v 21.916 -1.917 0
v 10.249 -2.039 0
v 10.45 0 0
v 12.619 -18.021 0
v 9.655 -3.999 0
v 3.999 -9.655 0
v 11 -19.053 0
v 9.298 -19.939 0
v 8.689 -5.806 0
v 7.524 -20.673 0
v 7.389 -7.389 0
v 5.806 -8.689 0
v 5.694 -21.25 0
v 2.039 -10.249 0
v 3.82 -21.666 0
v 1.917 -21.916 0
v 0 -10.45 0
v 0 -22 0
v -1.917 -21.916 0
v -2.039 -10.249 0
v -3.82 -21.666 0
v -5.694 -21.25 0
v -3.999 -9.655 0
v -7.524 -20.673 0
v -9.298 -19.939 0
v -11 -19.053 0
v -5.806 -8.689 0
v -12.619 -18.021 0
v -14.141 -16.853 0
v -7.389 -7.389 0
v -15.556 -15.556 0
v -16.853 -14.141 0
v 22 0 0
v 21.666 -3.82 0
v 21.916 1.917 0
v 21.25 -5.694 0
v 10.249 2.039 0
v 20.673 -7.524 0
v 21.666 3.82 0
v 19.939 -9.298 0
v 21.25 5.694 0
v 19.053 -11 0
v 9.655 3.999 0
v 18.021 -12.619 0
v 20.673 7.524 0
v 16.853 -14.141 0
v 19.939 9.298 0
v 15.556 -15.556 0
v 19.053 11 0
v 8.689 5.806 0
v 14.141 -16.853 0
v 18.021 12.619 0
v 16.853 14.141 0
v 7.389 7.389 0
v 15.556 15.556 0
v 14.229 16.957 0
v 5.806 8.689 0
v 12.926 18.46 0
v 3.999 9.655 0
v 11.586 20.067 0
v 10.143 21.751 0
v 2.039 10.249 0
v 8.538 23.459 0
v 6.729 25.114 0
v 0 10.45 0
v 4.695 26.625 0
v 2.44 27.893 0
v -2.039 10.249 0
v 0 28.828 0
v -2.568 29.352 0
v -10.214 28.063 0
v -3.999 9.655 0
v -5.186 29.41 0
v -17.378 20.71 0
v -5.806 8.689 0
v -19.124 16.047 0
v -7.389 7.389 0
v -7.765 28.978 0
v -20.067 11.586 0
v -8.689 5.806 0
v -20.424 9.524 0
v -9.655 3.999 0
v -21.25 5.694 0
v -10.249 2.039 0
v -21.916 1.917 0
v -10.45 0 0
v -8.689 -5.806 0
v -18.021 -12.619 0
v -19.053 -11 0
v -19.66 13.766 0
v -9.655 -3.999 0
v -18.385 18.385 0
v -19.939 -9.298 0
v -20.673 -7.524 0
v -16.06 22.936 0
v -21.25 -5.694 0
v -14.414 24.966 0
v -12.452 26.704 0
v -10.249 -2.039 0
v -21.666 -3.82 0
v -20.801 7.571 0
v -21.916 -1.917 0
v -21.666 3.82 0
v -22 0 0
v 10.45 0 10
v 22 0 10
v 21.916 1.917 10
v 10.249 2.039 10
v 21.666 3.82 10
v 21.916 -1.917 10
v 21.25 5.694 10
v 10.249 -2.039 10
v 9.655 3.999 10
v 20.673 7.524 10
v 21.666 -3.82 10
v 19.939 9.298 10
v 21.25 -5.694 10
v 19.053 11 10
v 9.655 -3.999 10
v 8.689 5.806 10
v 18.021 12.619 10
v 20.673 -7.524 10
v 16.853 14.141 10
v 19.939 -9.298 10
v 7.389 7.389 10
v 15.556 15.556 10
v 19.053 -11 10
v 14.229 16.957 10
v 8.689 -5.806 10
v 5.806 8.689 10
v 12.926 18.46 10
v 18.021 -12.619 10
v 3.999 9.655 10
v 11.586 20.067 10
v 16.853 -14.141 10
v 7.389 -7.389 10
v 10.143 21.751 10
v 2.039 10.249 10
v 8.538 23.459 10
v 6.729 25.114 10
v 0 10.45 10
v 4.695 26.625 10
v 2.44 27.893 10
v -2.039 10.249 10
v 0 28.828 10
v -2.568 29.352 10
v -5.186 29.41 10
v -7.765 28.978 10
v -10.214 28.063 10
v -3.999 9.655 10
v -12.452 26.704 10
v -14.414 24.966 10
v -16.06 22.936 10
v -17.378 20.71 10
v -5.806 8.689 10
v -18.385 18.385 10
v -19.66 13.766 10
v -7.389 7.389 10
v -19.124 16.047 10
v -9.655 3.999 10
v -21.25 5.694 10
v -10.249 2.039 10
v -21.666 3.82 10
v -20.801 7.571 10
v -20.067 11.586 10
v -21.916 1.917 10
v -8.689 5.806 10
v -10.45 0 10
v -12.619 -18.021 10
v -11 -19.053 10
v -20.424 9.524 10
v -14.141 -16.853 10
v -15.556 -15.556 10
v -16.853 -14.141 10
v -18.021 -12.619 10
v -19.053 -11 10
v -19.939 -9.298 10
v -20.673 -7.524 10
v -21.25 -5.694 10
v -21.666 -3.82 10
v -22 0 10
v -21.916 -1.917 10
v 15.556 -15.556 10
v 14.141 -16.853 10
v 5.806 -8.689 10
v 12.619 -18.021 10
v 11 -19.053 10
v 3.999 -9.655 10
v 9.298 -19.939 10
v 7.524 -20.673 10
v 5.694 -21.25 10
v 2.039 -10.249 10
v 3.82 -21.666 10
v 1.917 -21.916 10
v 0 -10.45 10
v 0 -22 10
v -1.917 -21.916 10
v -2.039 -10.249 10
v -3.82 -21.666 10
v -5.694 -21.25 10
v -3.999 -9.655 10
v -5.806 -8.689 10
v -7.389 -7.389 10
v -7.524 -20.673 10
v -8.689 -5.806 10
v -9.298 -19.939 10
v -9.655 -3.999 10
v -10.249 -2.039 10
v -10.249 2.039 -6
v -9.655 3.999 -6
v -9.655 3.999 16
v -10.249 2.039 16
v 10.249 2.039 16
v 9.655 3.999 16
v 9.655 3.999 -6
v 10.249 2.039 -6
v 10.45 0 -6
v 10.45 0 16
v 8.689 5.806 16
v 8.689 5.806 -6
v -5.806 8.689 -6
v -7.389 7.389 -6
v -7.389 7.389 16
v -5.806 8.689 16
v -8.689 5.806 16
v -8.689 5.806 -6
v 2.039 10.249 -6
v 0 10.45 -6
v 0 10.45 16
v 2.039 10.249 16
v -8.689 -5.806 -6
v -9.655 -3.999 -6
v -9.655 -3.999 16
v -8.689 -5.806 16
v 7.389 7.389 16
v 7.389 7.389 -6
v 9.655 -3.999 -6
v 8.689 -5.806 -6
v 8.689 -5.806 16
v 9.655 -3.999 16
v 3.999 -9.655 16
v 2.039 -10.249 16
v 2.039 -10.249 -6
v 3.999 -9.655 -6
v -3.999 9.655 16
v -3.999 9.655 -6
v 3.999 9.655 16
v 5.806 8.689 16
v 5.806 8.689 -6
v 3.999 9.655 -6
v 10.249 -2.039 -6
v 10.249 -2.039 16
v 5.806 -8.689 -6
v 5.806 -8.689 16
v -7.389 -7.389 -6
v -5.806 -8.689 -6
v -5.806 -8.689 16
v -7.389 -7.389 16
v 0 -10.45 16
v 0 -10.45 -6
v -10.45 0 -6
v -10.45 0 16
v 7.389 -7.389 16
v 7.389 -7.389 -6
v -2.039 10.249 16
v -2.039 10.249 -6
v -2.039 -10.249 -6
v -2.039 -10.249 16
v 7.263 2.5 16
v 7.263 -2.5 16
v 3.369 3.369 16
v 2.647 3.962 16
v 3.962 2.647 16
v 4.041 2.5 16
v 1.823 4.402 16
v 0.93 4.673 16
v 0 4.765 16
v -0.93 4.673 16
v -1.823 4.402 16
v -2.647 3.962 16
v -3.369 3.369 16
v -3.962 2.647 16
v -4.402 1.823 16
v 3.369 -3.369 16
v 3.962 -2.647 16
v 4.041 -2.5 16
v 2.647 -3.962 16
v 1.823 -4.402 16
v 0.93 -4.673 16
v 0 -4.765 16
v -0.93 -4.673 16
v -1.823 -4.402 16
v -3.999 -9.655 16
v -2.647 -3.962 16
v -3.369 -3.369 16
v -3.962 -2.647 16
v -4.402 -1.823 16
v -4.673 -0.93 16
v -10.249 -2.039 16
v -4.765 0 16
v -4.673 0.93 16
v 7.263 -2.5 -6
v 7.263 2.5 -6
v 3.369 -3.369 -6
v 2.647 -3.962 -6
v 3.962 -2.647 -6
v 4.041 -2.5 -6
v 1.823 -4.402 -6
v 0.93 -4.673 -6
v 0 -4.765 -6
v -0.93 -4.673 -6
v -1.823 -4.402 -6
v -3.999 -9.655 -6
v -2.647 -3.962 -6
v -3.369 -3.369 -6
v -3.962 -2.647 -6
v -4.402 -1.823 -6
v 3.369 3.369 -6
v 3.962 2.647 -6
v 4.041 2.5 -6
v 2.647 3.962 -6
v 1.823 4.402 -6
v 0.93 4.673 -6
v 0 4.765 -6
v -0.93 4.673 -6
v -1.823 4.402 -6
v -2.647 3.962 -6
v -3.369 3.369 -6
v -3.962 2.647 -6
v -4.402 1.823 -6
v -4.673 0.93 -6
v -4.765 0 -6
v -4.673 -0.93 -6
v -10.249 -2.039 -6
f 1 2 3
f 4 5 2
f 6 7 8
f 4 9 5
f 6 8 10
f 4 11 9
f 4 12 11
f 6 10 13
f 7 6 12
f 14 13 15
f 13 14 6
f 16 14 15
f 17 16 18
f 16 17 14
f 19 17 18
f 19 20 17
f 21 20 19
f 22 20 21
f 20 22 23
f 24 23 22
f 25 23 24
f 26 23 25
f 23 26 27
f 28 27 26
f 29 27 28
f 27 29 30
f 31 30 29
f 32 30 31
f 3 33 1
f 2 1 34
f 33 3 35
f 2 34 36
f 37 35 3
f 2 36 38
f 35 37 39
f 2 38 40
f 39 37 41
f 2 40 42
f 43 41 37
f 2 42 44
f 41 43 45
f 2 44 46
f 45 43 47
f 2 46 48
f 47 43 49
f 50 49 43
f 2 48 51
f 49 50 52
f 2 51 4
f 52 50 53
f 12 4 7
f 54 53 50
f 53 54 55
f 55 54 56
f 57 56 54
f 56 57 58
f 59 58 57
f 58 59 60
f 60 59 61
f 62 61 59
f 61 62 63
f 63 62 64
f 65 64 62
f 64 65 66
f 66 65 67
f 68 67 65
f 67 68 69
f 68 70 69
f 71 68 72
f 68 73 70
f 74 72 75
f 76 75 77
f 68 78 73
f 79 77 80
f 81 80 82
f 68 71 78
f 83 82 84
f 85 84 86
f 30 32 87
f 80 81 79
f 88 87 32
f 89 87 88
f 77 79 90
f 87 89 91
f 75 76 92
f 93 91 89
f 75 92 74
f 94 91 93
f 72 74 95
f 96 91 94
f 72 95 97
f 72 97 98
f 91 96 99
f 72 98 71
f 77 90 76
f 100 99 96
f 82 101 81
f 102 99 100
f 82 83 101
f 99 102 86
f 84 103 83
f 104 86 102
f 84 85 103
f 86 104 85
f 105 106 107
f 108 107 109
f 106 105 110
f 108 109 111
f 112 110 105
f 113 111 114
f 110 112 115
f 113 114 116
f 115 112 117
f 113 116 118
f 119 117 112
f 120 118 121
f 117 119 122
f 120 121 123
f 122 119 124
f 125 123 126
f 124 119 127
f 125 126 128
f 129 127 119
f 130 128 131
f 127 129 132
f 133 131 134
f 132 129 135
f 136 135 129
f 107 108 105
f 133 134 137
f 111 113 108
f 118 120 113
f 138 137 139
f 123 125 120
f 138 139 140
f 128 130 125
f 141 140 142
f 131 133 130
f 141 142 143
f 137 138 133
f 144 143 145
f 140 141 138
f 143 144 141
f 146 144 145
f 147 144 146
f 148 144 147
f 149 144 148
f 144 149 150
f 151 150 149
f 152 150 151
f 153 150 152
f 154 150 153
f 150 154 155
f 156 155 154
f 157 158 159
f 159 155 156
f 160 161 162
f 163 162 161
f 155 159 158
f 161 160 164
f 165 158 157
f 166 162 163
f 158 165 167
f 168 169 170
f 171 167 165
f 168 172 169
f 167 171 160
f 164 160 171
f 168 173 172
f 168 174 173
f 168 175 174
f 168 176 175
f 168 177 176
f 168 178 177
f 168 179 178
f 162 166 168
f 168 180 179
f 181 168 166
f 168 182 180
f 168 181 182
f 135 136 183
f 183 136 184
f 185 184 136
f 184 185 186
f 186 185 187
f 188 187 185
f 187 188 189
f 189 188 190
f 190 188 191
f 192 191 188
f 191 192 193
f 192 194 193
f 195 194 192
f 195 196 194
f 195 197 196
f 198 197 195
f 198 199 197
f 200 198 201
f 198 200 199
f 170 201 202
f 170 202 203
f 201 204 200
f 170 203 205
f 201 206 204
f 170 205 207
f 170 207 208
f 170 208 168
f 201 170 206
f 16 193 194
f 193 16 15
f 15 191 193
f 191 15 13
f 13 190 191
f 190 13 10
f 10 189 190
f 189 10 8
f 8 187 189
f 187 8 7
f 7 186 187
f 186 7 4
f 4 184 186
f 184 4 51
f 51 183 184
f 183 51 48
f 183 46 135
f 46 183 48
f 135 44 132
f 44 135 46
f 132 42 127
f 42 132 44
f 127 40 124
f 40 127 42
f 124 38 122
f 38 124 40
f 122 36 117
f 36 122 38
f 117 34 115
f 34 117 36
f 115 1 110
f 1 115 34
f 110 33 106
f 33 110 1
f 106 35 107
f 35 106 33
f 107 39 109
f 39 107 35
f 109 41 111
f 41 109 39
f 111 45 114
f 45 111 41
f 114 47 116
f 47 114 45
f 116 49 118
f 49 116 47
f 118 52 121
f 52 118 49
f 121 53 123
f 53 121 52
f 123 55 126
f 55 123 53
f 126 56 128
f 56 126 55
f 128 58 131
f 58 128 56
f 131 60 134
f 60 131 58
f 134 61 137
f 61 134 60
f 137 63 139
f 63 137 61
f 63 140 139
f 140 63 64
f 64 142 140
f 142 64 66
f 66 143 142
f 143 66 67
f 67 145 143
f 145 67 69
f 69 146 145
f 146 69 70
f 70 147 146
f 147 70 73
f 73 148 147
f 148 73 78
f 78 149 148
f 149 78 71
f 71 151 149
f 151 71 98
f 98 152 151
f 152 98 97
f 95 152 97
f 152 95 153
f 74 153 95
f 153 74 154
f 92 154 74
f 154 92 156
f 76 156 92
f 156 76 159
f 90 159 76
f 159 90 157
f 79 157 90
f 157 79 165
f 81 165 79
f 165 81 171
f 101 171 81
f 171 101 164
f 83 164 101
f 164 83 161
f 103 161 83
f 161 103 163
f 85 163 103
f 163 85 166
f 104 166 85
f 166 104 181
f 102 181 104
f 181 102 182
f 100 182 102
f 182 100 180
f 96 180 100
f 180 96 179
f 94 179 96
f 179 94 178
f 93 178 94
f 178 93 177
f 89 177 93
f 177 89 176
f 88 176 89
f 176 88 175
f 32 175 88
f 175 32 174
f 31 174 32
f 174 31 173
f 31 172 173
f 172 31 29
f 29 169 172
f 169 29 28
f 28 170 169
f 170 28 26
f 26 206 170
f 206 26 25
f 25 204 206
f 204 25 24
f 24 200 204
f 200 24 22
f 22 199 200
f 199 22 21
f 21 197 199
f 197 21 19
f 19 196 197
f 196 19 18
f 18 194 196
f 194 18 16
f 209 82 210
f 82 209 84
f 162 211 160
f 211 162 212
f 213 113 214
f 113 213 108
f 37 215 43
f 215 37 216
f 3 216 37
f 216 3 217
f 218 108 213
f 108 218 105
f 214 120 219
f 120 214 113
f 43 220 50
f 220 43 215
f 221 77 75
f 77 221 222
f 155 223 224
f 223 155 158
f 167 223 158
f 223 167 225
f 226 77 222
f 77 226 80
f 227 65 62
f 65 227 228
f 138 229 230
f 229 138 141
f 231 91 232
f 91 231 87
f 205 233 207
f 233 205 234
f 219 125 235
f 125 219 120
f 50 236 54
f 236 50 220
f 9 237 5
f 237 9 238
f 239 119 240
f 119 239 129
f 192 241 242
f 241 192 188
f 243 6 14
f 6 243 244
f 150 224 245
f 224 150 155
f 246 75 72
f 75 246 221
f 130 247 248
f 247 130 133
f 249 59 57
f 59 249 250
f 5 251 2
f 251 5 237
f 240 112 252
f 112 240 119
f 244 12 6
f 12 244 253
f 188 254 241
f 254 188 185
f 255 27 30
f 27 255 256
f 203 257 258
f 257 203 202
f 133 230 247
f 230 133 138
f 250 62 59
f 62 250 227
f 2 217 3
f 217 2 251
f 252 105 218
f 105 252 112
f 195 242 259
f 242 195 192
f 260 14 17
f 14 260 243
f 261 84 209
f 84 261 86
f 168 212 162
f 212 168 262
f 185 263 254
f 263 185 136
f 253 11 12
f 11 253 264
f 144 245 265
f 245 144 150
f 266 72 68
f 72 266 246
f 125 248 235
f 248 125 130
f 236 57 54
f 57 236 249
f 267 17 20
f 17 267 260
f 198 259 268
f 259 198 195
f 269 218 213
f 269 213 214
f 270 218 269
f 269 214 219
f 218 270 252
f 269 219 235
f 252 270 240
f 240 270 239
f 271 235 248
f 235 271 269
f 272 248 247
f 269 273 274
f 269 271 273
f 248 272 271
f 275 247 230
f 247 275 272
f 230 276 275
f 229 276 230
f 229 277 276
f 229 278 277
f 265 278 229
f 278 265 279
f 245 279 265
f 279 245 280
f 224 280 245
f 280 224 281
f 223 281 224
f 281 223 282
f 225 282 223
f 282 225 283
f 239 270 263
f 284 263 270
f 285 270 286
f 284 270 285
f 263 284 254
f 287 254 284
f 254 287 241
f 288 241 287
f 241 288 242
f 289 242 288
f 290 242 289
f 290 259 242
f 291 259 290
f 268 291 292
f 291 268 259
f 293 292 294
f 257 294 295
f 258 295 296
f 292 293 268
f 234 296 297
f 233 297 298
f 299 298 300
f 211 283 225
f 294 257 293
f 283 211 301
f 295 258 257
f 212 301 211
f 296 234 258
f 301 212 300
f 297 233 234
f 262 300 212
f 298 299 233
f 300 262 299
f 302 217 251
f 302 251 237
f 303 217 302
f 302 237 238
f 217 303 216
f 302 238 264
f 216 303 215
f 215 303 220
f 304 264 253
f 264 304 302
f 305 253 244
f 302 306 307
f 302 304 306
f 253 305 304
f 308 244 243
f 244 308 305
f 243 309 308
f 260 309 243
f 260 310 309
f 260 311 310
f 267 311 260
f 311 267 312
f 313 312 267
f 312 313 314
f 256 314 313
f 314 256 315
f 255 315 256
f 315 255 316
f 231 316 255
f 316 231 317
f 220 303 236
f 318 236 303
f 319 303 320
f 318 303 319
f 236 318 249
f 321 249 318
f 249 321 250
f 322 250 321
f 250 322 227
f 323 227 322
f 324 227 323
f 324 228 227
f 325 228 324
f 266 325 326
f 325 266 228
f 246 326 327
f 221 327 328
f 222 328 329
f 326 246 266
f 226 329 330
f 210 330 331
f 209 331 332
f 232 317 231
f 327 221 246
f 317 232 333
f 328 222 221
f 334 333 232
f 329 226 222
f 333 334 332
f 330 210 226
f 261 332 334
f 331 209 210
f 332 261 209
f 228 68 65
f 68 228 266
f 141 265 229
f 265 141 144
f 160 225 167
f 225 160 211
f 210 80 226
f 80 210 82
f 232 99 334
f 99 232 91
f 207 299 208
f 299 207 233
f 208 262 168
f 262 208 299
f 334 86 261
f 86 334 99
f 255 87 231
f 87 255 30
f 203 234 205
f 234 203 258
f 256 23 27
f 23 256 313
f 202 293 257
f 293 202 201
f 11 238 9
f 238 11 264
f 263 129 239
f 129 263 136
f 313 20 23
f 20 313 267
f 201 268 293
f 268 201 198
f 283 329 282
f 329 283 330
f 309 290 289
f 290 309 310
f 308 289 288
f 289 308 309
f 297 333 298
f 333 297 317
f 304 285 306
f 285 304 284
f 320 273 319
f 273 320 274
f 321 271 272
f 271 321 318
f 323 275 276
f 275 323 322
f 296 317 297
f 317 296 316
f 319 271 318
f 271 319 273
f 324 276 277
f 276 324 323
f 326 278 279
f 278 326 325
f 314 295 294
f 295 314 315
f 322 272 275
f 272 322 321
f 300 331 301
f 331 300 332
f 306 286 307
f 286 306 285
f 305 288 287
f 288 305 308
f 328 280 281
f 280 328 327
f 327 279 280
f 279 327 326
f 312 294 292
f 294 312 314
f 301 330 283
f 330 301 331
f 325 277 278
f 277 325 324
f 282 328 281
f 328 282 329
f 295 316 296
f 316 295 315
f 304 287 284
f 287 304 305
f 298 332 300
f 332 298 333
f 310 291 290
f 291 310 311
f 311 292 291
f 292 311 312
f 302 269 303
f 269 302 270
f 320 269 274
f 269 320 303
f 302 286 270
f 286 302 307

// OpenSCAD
$fn = 32;

// ----------------------------------------------------------------------
// Cam: base radius 22 mm with a 8 mm lift over 120 degrees
// ----------------------------------------------------------------------

// --- parameters (mm) ---
base_r = 22;              // base radius
lift = 8;                 // lift height above the base radius
lift_span = 120;          // angular width of the lift
lift_start = 45;          // angle where the lift starts
cam_t = 10;               // cam plate thickness
hub_d = 20.9;             // hub diameter
hub_h = 22;               // hub height
bore_d = 9.53;            // bore
key_w = 5;                // keyway width
key_depth = 2.5;          // keyway depth

cam_profile = [[22, 0], [21.916, 1.917], [21.666, 3.82], [21.25, 5.694], [20.673, 7.524], [19.939, 9.298], [19.053, 11], [18.021, 12.619], [16.853, 14.141], [15.556, 15.556], [14.229, 16.957], [12.926, 18.46], [11.586, 20.067], [10.143, 21.751], [8.538, 23.459], [6.729, 25.114], [4.695, 26.625], [2.44, 27.893], [0, 28.828], [-2.568, 29.352], [-5.186, 29.41], [-7.765, 28.978], [-10.214, 28.063], [-12.452, 26.704], [-14.414, 24.966], [-16.06, 22.936], [-17.378, 20.71], [-18.385, 18.385], [-19.124, 16.047], [-19.66, 13.766], [-20.067, 11.586], [-20.424, 9.524], [-20.801, 7.571], [-21.25, 5.694], [-21.666, 3.82], [-21.916, 1.917], [-22, 0], [-21.916, -1.917], [-21.666, -3.82], [-21.25, -5.694], [-20.673, -7.524], [-19.939, -9.298], [-19.053, -11], [-18.021, -12.619], [-16.853, -14.141], [-15.556, -15.556], [-14.141, -16.853], [-12.619, -18.021], [-11, -19.053], [-9.298, -19.939], [-7.524, -20.673], [-5.694, -21.25], [-3.82, -21.666], [-1.917, -21.916], [0, -22], [1.917, -21.916], [3.82, -21.666], [5.694, -21.25], [7.524, -20.673], [9.298, -19.939], [11, -19.053], [12.619, -18.021], [14.141, -16.853], [15.556, -15.556], [16.853, -14.141], [18.021, -12.619], [19.053, -11], [19.939, -9.298], [20.673, -7.524], [21.25, -5.694], [21.666, -3.82], [21.916, -1.917]];

difference() {
  union() {
    linear_extrude(height = cam_t) polygon(cam_profile);
    /* hub, proud of the cam plate on both sides */
    translate([0, 0, -6]) cylinder(h = hub_h, d = hub_d);
  }
  /* bore through the hub, 2.5 mm clear on both faces */
  translate([0, 0, -8.5]) cylinder(h = hub_h + 5, d = bore_d);
  /* keyway, milled through the whole hub */
  translate([2.263, -2.5, -8.5]) cube([5, 5, 27]);
}
